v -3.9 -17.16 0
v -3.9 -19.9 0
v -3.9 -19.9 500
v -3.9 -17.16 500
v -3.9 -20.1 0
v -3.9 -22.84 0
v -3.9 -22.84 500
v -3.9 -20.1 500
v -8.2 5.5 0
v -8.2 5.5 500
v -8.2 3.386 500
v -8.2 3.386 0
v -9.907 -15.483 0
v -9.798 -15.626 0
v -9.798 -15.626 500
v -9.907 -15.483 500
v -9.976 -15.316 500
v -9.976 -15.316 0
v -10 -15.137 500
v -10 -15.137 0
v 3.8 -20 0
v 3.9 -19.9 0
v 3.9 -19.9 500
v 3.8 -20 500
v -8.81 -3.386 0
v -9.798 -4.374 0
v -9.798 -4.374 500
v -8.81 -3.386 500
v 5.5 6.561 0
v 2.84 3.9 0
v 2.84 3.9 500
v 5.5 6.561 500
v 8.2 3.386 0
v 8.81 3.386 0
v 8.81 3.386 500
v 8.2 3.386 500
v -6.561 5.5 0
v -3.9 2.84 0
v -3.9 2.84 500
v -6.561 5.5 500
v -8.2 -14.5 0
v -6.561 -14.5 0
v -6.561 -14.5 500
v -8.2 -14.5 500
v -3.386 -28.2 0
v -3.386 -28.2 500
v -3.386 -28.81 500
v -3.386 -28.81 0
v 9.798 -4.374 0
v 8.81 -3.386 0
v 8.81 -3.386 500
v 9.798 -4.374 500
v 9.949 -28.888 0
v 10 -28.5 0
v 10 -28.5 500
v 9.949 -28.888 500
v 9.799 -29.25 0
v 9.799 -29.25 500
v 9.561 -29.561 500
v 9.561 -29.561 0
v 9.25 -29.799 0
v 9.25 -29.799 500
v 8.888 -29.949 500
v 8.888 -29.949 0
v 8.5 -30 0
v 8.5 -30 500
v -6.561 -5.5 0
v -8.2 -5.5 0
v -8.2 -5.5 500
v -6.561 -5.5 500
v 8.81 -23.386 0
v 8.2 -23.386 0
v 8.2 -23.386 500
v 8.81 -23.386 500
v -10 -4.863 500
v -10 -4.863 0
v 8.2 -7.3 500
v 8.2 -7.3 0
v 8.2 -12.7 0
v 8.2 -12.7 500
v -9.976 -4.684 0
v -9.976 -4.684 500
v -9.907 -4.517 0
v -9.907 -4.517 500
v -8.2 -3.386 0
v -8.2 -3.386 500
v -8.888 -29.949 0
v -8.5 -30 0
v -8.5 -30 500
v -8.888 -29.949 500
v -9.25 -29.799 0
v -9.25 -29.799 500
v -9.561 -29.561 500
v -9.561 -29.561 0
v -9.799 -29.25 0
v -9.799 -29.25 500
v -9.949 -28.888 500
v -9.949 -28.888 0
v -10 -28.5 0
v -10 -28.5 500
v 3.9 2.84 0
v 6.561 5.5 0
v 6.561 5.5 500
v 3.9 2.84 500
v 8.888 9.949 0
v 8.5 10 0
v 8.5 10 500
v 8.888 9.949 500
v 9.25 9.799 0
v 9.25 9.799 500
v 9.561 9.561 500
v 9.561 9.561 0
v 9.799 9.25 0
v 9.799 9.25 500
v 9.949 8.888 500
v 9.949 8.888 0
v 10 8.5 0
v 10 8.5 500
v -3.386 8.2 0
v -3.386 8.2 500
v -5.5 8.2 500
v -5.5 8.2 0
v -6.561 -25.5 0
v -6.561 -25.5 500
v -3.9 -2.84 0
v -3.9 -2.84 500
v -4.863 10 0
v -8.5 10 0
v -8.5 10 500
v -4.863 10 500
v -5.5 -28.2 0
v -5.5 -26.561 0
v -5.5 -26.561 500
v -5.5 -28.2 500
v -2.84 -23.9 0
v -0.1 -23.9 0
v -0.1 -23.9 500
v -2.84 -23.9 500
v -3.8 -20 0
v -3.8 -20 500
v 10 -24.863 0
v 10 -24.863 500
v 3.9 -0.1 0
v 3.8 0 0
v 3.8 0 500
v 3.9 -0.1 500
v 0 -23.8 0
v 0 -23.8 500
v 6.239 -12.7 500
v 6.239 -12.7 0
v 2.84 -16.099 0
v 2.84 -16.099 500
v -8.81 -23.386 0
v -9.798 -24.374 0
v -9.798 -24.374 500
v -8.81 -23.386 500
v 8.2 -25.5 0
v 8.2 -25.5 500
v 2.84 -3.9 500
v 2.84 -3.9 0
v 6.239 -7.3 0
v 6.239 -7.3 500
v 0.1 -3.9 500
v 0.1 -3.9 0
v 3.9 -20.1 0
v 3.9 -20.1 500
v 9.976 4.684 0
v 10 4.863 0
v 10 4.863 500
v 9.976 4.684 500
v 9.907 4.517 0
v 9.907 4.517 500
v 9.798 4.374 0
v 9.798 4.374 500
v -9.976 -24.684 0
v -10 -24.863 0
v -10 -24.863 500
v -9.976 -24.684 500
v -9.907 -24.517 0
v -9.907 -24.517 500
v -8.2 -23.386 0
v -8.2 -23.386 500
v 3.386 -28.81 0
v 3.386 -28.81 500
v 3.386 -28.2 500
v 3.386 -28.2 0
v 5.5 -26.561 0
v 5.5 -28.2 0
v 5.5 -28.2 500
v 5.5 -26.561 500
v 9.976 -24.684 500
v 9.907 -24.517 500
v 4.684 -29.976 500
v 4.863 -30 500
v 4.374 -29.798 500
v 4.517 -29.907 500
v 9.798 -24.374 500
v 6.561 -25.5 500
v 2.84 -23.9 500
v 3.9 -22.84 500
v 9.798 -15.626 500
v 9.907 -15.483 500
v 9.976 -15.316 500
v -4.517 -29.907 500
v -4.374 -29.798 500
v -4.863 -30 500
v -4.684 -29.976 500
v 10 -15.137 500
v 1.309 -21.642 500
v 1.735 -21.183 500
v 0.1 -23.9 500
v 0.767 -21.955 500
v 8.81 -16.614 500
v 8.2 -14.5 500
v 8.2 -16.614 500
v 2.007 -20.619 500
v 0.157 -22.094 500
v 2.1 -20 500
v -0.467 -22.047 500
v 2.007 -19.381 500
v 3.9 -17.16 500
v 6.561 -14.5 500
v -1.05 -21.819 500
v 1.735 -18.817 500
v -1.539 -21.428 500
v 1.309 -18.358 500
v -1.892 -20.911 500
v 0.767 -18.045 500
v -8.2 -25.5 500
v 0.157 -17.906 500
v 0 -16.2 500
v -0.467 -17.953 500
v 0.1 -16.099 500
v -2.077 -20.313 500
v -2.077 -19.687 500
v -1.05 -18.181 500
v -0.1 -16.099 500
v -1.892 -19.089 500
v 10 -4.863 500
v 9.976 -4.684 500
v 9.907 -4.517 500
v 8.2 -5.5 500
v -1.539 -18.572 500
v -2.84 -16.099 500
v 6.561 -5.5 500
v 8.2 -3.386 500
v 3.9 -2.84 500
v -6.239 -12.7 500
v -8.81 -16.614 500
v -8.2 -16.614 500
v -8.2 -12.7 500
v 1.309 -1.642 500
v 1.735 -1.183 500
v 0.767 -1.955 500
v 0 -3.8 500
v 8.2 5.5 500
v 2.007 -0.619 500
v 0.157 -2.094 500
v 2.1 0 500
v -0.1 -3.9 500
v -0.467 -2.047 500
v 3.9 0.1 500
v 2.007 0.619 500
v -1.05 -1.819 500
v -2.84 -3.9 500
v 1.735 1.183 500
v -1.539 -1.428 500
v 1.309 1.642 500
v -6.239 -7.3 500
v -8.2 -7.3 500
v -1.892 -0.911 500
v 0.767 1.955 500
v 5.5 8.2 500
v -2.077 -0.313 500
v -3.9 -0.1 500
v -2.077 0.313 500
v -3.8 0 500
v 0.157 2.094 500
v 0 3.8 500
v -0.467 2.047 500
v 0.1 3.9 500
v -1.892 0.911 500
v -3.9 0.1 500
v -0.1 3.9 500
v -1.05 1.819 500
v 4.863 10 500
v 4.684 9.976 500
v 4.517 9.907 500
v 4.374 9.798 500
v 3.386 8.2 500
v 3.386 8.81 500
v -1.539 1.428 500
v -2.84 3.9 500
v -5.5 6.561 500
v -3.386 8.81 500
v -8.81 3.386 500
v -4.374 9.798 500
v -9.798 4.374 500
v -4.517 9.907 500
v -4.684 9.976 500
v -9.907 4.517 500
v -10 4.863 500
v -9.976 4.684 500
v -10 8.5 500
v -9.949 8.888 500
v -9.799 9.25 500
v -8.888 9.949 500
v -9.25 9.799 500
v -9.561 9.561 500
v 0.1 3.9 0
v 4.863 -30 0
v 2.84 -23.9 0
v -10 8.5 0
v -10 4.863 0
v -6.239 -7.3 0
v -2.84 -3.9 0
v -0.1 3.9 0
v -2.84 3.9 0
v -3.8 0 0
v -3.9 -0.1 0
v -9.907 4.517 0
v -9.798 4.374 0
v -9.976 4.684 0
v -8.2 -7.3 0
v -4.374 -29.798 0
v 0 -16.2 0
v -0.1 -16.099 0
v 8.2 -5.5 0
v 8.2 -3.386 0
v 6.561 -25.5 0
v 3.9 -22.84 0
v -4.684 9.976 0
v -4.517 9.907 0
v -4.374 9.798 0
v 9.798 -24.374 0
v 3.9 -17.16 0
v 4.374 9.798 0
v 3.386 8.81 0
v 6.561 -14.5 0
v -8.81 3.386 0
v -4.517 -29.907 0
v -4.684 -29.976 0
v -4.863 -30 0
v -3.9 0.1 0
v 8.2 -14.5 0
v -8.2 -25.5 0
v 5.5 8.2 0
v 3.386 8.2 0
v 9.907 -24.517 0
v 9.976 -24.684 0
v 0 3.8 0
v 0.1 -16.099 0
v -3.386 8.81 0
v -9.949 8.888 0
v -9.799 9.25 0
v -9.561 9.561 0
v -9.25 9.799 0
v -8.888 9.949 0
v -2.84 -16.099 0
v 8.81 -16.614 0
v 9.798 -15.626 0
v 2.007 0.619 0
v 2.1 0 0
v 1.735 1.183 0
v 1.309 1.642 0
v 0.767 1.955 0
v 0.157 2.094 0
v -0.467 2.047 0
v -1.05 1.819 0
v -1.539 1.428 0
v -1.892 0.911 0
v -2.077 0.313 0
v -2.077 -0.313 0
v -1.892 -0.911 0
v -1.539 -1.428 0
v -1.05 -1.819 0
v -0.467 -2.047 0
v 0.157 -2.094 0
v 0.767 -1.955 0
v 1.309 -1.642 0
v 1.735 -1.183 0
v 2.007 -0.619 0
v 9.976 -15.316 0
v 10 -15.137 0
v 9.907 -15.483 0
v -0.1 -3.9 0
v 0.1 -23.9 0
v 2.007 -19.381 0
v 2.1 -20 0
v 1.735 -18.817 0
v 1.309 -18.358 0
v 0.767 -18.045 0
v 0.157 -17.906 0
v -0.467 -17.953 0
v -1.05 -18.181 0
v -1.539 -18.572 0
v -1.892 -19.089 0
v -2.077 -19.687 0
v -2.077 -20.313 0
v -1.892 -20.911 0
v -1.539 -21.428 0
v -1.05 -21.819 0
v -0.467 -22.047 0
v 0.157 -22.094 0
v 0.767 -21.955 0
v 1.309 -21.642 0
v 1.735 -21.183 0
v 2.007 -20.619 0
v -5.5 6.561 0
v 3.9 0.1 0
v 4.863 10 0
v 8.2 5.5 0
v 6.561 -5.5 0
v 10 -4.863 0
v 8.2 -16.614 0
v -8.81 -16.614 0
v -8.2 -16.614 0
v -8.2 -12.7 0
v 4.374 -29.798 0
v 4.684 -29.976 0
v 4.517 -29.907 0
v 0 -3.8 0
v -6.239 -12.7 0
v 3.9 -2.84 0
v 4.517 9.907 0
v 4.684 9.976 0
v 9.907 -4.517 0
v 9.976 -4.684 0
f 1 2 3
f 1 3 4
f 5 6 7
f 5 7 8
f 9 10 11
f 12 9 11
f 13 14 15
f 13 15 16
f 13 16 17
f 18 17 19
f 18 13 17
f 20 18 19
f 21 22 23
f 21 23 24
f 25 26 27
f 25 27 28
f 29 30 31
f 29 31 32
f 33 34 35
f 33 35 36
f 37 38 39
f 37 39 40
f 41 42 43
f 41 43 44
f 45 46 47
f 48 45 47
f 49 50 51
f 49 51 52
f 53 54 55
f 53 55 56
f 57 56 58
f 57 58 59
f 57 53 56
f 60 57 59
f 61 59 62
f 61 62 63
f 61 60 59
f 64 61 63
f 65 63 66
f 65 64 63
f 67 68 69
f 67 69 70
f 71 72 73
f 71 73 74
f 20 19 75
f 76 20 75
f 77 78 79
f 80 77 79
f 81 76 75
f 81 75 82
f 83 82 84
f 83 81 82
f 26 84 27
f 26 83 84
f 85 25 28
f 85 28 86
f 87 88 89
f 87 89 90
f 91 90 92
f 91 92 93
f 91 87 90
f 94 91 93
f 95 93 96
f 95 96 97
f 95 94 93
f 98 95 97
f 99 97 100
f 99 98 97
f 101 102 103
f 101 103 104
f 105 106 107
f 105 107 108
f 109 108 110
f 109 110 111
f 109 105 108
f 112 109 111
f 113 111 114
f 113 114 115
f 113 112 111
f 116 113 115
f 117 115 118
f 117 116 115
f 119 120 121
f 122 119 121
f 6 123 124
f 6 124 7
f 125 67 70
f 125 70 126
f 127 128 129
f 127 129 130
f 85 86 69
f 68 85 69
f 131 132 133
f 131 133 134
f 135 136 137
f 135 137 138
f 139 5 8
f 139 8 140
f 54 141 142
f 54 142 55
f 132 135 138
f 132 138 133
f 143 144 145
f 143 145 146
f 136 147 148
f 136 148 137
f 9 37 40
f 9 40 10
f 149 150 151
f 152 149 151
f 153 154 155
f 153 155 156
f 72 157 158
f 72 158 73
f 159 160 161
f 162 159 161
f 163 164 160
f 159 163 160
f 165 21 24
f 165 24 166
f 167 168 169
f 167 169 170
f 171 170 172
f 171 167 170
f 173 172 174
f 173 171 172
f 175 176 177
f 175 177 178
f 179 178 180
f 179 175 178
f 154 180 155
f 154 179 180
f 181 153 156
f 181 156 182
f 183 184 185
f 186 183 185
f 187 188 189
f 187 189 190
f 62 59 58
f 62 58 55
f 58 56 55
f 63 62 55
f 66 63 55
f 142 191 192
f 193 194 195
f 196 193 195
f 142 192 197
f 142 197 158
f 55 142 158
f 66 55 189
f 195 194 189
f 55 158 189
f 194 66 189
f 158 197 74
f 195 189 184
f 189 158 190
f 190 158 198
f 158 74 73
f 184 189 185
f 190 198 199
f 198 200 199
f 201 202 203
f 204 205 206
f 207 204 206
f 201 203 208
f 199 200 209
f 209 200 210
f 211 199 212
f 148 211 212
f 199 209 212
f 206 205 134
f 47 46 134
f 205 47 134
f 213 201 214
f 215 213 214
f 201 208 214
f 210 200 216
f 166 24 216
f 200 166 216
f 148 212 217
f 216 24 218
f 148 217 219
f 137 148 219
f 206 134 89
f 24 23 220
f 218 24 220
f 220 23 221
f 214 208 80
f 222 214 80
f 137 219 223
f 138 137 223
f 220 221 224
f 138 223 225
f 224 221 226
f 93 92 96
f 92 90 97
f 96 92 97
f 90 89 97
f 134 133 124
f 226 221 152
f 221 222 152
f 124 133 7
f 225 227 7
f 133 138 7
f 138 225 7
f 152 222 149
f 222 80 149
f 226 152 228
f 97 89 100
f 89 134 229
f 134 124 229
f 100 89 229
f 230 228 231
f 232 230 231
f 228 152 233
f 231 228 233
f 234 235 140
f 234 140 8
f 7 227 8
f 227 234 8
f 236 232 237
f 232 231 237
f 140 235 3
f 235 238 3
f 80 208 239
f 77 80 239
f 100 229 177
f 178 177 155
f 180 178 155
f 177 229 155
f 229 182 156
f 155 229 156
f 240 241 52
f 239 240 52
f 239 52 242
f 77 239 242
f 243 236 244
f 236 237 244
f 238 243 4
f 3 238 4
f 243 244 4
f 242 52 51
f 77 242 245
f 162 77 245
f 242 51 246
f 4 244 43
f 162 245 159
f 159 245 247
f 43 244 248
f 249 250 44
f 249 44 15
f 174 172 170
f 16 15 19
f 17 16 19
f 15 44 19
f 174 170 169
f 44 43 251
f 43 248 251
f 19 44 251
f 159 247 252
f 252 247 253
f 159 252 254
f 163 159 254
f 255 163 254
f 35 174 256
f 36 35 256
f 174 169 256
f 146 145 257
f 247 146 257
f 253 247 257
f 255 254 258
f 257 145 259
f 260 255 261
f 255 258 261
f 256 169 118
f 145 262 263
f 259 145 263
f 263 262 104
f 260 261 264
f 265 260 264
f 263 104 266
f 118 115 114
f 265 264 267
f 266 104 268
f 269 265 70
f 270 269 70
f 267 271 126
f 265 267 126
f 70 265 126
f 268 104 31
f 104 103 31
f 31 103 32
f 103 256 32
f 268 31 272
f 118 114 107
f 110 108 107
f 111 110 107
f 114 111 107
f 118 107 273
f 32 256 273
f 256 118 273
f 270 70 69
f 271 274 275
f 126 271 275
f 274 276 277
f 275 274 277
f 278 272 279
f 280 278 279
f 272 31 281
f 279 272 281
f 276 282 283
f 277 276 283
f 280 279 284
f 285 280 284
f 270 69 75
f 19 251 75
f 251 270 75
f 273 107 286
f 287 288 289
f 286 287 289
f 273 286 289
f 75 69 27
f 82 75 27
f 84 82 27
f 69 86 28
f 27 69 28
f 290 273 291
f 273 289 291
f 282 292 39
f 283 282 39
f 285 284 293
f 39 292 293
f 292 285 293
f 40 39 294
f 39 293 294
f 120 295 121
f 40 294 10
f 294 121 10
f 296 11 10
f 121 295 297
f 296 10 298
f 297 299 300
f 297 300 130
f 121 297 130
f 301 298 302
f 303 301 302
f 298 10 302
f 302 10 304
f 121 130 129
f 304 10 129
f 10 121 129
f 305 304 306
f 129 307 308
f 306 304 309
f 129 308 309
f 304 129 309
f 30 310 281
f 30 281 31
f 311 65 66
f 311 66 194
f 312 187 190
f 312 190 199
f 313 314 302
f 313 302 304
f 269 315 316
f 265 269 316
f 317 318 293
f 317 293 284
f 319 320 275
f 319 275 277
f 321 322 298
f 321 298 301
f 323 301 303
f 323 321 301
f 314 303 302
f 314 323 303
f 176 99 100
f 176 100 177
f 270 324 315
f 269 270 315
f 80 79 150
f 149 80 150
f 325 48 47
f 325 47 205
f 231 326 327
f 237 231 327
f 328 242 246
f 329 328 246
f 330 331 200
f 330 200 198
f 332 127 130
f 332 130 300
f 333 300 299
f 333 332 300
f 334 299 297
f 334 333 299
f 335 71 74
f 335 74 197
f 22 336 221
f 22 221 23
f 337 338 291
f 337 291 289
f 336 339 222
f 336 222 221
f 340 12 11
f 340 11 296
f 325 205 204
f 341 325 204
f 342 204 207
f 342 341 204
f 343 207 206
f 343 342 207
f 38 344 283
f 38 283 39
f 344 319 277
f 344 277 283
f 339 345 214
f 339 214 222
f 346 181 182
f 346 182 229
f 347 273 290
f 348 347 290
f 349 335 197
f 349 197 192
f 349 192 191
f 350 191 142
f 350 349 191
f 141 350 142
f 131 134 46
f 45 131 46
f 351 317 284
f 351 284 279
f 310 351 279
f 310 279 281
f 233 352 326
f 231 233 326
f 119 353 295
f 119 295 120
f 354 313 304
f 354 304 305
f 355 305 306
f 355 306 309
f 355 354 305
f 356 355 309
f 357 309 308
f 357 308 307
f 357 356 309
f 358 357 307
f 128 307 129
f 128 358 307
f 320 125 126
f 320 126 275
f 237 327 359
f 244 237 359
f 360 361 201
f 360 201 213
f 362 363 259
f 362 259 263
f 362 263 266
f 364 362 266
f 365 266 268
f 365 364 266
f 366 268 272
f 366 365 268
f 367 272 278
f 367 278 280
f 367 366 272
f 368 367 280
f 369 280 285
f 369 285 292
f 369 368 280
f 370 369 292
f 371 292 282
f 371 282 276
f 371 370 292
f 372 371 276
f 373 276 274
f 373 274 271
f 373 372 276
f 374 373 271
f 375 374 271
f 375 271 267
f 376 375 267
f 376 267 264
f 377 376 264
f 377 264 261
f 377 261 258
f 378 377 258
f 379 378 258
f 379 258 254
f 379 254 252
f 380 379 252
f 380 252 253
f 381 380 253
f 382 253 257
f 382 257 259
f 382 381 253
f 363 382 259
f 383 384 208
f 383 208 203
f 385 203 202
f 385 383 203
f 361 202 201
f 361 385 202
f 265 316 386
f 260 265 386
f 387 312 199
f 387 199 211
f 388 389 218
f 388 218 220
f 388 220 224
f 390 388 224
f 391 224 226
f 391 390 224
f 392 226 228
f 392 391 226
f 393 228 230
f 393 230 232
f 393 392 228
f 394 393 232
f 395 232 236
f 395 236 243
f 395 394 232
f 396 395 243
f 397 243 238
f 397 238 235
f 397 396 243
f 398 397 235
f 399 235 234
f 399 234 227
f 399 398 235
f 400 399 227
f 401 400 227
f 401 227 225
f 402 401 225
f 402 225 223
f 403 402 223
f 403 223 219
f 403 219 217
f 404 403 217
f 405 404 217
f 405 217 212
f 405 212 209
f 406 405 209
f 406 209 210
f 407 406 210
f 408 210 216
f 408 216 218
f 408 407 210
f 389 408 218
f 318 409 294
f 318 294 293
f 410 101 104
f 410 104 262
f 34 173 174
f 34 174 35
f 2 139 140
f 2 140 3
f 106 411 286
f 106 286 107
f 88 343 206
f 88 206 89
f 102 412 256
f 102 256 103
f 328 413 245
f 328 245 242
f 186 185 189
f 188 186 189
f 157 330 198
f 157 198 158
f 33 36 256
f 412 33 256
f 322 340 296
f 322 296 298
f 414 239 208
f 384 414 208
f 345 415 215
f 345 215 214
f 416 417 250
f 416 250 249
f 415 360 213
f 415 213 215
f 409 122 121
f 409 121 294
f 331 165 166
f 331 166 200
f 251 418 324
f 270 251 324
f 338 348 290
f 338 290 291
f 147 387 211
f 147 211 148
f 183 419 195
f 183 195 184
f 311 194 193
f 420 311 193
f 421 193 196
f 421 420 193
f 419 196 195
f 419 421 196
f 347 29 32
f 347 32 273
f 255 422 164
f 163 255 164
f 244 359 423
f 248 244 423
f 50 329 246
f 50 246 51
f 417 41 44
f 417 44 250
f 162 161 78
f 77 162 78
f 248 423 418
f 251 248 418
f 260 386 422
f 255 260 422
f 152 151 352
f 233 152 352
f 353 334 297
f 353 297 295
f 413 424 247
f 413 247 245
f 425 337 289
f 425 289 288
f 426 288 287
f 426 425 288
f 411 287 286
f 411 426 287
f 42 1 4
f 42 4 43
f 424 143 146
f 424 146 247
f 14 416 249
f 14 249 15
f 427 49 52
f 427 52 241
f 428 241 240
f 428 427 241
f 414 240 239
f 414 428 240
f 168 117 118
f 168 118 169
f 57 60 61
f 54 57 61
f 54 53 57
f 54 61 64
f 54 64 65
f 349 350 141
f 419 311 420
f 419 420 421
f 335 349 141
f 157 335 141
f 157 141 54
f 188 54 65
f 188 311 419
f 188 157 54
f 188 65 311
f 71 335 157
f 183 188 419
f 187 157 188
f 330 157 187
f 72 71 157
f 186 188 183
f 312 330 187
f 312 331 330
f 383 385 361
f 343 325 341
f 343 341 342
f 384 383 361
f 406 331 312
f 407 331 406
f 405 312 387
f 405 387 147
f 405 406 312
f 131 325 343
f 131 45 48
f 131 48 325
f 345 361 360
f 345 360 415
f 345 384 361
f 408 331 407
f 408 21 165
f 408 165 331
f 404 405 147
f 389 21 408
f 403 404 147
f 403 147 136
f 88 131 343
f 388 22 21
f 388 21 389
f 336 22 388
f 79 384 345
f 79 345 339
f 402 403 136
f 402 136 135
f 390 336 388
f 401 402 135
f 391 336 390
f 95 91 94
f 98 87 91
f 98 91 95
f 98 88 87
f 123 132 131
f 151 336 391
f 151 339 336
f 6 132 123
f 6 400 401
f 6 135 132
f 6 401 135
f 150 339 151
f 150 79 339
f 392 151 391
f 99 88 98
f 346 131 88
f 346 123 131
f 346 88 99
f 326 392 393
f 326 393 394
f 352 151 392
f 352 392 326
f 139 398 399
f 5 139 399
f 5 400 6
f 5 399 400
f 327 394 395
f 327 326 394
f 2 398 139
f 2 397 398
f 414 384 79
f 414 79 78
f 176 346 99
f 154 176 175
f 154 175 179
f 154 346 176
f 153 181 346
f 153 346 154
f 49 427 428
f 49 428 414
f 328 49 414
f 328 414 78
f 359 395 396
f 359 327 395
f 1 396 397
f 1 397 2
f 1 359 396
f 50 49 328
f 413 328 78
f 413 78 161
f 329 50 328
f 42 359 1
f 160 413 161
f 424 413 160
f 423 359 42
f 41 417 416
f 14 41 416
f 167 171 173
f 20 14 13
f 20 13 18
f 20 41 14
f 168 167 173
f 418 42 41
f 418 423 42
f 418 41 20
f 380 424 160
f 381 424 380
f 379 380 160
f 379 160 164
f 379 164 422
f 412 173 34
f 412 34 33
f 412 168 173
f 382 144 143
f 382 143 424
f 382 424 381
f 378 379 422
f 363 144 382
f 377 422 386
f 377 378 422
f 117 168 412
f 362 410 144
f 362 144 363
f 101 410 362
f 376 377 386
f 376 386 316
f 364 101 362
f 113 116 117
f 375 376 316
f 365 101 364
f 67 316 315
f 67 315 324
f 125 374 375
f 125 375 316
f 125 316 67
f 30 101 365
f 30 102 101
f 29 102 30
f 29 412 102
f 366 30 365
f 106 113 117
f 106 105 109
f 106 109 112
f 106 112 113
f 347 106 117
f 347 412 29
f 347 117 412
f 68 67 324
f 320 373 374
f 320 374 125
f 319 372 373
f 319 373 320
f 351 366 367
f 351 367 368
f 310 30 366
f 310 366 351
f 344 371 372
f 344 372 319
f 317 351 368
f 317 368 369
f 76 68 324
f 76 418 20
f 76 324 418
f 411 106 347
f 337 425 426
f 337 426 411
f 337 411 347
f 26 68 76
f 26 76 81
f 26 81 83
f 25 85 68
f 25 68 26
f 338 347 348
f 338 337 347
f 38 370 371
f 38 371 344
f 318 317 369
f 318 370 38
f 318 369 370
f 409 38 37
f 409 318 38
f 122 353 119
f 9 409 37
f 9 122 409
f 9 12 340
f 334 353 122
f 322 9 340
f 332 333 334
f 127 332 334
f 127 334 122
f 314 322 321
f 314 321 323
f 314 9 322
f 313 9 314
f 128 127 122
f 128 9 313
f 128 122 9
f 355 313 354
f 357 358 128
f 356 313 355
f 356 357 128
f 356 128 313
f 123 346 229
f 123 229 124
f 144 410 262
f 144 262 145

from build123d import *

# Parameters (mm, degrees)
SKETCH1_R           = 2.1
BOSS_EXTRUDE2_DEPTH = 500


with BuildPart() as part:
    # Sketch1 → Boss-Extrude2 (new body)
    with BuildSketch(Plane.XY):
        with BuildLine():
            Line((-8.5, 10), (-4.862792737, 10))
            ThreePointArc((-4.862792737, 10), (-4.598292737, 9.947387679), (-4.374060464, 9.797560464))
            Line((-4.374060464, 9.797560464), (-3.3865, 8.81))
            Line((-3.3865, 8.81), (-3.3865, 8.2))
            Line((-3.3865, 8.2), (-5.5, 8.2))
            Line((-5.5, 8.2), (-5.5, 6.561))
            Line((-5.5, 6.561), (-2.8395, 3.9005))
            Line((-2.8395, 3.9005), (-0.1, 3.9005))
            Line((-0.1, 3.9005), (0, 3.8005))
            Line((0, 3.8005), (0.1, 3.9005))
            Line((0.1, 3.9005), (2.8395, 3.9005))
            Line((2.8395, 3.9005), (5.5, 6.561))
            Line((5.5, 6.561), (5.5, 8.2))
            Line((5.5, 8.2), (3.3865, 8.2))
            Line((3.3865, 8.2), (3.3865, 8.81))
            Line((3.3865, 8.81), (4.374060464, 9.797560464))
            ThreePointArc((4.374060464, 9.797560464), (4.598292737, 9.947387679), (4.862792737, 10))
            Line((4.862792737, 10), (8.5, 10))
            ThreePointArc((8.5, 10), (9.560660172, 9.560660172), (10, 8.5))
            Line((10, 8.5), (10, 4.862792737))
            ThreePointArc((10, 4.862792737), (9.947387679, 4.598292737), (9.797560464, 4.374060464))
            Line((9.797560464, 4.374060464), (8.81, 3.3865))
            Line((8.81, 3.3865), (8.2, 3.3865))
            Line((8.2, 3.3865), (8.2, 5.5))
            Line((8.2, 5.5), (6.561, 5.5))
            Line((6.561, 5.5), (3.9005, 2.8395))
            Line((3.9005, 2.8395), (3.9005, 0.1))
            Line((3.9005, 0.1), (3.8005, 0))
            Line((3.8005, 0), (3.9005, -0.1))
            Line((3.9005, -0.1), (3.9005, -2.8395))
            Line((3.9005, -2.8395), (6.561, -5.5))
            Line((6.561, -5.5), (8.2, -5.5))
            Line((8.2, -5.5), (8.2, -3.3865))
            Line((8.2, -3.3865), (8.81, -3.3865))
            Line((8.81, -3.3865), (9.797560464, -4.374060464))
            ThreePointArc((9.797560464, -4.374060464), (9.947387679, -4.598292737), (10, -4.862792737))
            Line((10, -4.862792737), (10, -15.137207263))
            ThreePointArc((10, -15.137207263), (9.947387679, -15.401707263), (9.797560464, -15.625939536))
            Line((9.797560464, -15.625939536), (8.81, -16.6135))
            Line((8.81, -16.6135), (8.2, -16.6135))
            Line((8.2, -16.6135), (8.2, -14.5))
            Line((8.2, -14.5), (6.561, -14.5))
            Line((6.561, -14.5), (3.9005, -17.1605))
            Line((3.9005, -17.1605), (3.9005, -19.9))
            Line((3.9005, -19.9), (3.8005, -20))
            Line((3.8005, -20), (3.9005, -20.1))
            Line((3.9005, -20.1), (3.9005, -22.8395))
            Line((3.9005, -22.8395), (6.561, -25.5))
            Line((6.561, -25.5), (8.2, -25.5))
            Line((8.2, -25.5), (8.2, -23.3865))
            Line((8.2, -23.3865), (8.81, -23.3865))
            Line((8.81, -23.3865), (9.797560464, -24.374060464))
            ThreePointArc((9.797560464, -24.374060464), (9.947387679, -24.598292737), (10, -24.862792737))
            Line((10, -24.862792737), (10, -28.5))
            ThreePointArc((10, -28.5), (9.560660172, -29.560660172), (8.5, -30))
            Line((8.5, -30), (4.862792737, -30))
            ThreePointArc((4.862792737, -30), (4.598292737, -29.947387679), (4.374060464, -29.797560464))
            Line((4.374060464, -29.797560464), (3.3865, -28.81))
            Line((3.3865, -28.81), (3.3865, -28.2))
            Line((3.3865, -28.2), (5.5, -28.2))
            Line((5.5, -28.2), (5.5, -26.561))
            Line((5.5, -26.561), (2.8395, -23.9005))
            Line((2.8395, -23.9005), (0.1, -23.9005))
            Line((0.1, -23.9005), (0, -23.8005))
            Line((0, -23.8005), (-0.1, -23.9005))
            Line((-0.1, -23.9005), (-2.8395, -23.9005))
            Line((-2.8395, -23.9005), (-5.5, -26.561))
            Line((-5.5, -26.561), (-5.5, -28.2))
            Line((-5.5, -28.2), (-3.3865, -28.2))
            Line((-3.3865, -28.2), (-3.3865, -28.81))
            Line((-3.3865, -28.81), (-4.374060464, -29.797560464))
            ThreePointArc((-4.374060464, -29.797560464), (-4.598292737, -29.947387679), (-4.862792737, -30))
            Line((-4.862792737, -30), (-8.5, -30))
            ThreePointArc((-8.5, -30), (-9.560660172, -29.560660172), (-10, -28.5))
            Line((-10, -28.5), (-10, -24.862792737))
            ThreePointArc((-10, -24.862792737), (-9.947387679, -24.598292737), (-9.797560464, -24.374060464))
            Line((-9.797560464, -24.374060464), (-8.81, -23.3865))
            Line((-8.81, -23.3865), (-8.2, -23.3865))
            Line((-8.2, -23.3865), (-8.2, -25.5))
            Line((-8.2, -25.5), (-6.561, -25.5))
            Line((-6.561, -25.5), (-3.9005, -22.8395))
            Line((-3.9005, -22.8395), (-3.9005, -20.1))
            Line((-3.9005, -20.1), (-3.8005, -20))
            Line((-3.8005, -20), (-3.9005, -19.9))
            Line((-3.9005, -19.9), (-3.9005, -17.1605))
            Line((-3.9005, -17.1605), (-6.561, -14.5))
            Line((-6.561, -14.5), (-8.2, -14.5))
            Line((-8.2, -14.5), (-8.2, -16.6135))
            Line((-8.2, -16.6135), (-8.81, -16.6135))
            Line((-8.81, -16.6135), (-9.797560464, -15.625939536))
            ThreePointArc((-9.797560464, -15.625939536), (-9.947387679, -15.401707263), (-10, -15.137207263))
            Line((-10, -15.137207263), (-10, -4.862792737))
            ThreePointArc((-10, -4.862792737), (-9.947387679, -4.598292737), (-9.797560464, -4.374060464))
            Line((-9.797560464, -4.374060464), (-8.81, -3.3865))
            Line((-8.81, -3.3865), (-8.2, -3.3865))
            Line((-8.2, -3.3865), (-8.2, -5.5))
            Line((-8.2, -5.5), (-6.561, -5.5))
            Line((-6.561, -5.5), (-3.9005, -2.8395))
            Line((-3.9005, -2.8395), (-3.9005, -0.1))
            Line((-3.9005, -0.1), (-3.8005, 0))
            Line((-3.8005, 0), (-3.9005, 0.1))
            Line((-3.9005, 0.1), (-3.9005, 2.8395))
            Line((-3.9005, 2.8395), (-6.561, 5.5))
            Line((-6.561, 5.5), (-8.2, 5.5))
            Line((-8.2, 5.5), (-8.2, 3.3865))
            Line((-8.2, 3.3865), (-8.81, 3.3865))
            Line((-8.81, 3.3865), (-9.797560464, 4.374060464))
            ThreePointArc((-9.797560464, 4.374060464), (-9.947387679, 4.598292737), (-10, 4.862792737))
            Line((-10, 4.862792737), (-10, 8.5))
            ThreePointArc((-10, 8.5), (-9.560660172, 9.560660172), (-8.5, 10))
        make_face()
        Circle(SKETCH1_R, mode=Mode.SUBTRACT)
        with Locations((0, -20)):
            Circle(SKETCH1_R, mode=Mode.SUBTRACT)
        Polygon((-8.2, -12.7), (-8.2, -7.3), (-6.239, -7.3), (-5.5, -6.561), (-2.8395, -3.9005), (-0.1, -3.9005), (0, -3.8005), (0.1, -3.9005), (2.8395, -3.9005), (5.5, -6.561), (6.239, -7.3), (8.2, -7.3), (8.2, -12.7), (6.239, -12.7), (5.5, -13.439), (2.8395, -16.0995), (0.1, -16.0995), (0, -16.1995), (-0.1, -16.0995), (-2.8395, -16.0995), (-5.5, -13.439), (-6.239, -12.7), align=None, mode=Mode.SUBTRACT)
    extrude(amount=BOSS_EXTRUDE2_DEPTH)


solid = part.part
